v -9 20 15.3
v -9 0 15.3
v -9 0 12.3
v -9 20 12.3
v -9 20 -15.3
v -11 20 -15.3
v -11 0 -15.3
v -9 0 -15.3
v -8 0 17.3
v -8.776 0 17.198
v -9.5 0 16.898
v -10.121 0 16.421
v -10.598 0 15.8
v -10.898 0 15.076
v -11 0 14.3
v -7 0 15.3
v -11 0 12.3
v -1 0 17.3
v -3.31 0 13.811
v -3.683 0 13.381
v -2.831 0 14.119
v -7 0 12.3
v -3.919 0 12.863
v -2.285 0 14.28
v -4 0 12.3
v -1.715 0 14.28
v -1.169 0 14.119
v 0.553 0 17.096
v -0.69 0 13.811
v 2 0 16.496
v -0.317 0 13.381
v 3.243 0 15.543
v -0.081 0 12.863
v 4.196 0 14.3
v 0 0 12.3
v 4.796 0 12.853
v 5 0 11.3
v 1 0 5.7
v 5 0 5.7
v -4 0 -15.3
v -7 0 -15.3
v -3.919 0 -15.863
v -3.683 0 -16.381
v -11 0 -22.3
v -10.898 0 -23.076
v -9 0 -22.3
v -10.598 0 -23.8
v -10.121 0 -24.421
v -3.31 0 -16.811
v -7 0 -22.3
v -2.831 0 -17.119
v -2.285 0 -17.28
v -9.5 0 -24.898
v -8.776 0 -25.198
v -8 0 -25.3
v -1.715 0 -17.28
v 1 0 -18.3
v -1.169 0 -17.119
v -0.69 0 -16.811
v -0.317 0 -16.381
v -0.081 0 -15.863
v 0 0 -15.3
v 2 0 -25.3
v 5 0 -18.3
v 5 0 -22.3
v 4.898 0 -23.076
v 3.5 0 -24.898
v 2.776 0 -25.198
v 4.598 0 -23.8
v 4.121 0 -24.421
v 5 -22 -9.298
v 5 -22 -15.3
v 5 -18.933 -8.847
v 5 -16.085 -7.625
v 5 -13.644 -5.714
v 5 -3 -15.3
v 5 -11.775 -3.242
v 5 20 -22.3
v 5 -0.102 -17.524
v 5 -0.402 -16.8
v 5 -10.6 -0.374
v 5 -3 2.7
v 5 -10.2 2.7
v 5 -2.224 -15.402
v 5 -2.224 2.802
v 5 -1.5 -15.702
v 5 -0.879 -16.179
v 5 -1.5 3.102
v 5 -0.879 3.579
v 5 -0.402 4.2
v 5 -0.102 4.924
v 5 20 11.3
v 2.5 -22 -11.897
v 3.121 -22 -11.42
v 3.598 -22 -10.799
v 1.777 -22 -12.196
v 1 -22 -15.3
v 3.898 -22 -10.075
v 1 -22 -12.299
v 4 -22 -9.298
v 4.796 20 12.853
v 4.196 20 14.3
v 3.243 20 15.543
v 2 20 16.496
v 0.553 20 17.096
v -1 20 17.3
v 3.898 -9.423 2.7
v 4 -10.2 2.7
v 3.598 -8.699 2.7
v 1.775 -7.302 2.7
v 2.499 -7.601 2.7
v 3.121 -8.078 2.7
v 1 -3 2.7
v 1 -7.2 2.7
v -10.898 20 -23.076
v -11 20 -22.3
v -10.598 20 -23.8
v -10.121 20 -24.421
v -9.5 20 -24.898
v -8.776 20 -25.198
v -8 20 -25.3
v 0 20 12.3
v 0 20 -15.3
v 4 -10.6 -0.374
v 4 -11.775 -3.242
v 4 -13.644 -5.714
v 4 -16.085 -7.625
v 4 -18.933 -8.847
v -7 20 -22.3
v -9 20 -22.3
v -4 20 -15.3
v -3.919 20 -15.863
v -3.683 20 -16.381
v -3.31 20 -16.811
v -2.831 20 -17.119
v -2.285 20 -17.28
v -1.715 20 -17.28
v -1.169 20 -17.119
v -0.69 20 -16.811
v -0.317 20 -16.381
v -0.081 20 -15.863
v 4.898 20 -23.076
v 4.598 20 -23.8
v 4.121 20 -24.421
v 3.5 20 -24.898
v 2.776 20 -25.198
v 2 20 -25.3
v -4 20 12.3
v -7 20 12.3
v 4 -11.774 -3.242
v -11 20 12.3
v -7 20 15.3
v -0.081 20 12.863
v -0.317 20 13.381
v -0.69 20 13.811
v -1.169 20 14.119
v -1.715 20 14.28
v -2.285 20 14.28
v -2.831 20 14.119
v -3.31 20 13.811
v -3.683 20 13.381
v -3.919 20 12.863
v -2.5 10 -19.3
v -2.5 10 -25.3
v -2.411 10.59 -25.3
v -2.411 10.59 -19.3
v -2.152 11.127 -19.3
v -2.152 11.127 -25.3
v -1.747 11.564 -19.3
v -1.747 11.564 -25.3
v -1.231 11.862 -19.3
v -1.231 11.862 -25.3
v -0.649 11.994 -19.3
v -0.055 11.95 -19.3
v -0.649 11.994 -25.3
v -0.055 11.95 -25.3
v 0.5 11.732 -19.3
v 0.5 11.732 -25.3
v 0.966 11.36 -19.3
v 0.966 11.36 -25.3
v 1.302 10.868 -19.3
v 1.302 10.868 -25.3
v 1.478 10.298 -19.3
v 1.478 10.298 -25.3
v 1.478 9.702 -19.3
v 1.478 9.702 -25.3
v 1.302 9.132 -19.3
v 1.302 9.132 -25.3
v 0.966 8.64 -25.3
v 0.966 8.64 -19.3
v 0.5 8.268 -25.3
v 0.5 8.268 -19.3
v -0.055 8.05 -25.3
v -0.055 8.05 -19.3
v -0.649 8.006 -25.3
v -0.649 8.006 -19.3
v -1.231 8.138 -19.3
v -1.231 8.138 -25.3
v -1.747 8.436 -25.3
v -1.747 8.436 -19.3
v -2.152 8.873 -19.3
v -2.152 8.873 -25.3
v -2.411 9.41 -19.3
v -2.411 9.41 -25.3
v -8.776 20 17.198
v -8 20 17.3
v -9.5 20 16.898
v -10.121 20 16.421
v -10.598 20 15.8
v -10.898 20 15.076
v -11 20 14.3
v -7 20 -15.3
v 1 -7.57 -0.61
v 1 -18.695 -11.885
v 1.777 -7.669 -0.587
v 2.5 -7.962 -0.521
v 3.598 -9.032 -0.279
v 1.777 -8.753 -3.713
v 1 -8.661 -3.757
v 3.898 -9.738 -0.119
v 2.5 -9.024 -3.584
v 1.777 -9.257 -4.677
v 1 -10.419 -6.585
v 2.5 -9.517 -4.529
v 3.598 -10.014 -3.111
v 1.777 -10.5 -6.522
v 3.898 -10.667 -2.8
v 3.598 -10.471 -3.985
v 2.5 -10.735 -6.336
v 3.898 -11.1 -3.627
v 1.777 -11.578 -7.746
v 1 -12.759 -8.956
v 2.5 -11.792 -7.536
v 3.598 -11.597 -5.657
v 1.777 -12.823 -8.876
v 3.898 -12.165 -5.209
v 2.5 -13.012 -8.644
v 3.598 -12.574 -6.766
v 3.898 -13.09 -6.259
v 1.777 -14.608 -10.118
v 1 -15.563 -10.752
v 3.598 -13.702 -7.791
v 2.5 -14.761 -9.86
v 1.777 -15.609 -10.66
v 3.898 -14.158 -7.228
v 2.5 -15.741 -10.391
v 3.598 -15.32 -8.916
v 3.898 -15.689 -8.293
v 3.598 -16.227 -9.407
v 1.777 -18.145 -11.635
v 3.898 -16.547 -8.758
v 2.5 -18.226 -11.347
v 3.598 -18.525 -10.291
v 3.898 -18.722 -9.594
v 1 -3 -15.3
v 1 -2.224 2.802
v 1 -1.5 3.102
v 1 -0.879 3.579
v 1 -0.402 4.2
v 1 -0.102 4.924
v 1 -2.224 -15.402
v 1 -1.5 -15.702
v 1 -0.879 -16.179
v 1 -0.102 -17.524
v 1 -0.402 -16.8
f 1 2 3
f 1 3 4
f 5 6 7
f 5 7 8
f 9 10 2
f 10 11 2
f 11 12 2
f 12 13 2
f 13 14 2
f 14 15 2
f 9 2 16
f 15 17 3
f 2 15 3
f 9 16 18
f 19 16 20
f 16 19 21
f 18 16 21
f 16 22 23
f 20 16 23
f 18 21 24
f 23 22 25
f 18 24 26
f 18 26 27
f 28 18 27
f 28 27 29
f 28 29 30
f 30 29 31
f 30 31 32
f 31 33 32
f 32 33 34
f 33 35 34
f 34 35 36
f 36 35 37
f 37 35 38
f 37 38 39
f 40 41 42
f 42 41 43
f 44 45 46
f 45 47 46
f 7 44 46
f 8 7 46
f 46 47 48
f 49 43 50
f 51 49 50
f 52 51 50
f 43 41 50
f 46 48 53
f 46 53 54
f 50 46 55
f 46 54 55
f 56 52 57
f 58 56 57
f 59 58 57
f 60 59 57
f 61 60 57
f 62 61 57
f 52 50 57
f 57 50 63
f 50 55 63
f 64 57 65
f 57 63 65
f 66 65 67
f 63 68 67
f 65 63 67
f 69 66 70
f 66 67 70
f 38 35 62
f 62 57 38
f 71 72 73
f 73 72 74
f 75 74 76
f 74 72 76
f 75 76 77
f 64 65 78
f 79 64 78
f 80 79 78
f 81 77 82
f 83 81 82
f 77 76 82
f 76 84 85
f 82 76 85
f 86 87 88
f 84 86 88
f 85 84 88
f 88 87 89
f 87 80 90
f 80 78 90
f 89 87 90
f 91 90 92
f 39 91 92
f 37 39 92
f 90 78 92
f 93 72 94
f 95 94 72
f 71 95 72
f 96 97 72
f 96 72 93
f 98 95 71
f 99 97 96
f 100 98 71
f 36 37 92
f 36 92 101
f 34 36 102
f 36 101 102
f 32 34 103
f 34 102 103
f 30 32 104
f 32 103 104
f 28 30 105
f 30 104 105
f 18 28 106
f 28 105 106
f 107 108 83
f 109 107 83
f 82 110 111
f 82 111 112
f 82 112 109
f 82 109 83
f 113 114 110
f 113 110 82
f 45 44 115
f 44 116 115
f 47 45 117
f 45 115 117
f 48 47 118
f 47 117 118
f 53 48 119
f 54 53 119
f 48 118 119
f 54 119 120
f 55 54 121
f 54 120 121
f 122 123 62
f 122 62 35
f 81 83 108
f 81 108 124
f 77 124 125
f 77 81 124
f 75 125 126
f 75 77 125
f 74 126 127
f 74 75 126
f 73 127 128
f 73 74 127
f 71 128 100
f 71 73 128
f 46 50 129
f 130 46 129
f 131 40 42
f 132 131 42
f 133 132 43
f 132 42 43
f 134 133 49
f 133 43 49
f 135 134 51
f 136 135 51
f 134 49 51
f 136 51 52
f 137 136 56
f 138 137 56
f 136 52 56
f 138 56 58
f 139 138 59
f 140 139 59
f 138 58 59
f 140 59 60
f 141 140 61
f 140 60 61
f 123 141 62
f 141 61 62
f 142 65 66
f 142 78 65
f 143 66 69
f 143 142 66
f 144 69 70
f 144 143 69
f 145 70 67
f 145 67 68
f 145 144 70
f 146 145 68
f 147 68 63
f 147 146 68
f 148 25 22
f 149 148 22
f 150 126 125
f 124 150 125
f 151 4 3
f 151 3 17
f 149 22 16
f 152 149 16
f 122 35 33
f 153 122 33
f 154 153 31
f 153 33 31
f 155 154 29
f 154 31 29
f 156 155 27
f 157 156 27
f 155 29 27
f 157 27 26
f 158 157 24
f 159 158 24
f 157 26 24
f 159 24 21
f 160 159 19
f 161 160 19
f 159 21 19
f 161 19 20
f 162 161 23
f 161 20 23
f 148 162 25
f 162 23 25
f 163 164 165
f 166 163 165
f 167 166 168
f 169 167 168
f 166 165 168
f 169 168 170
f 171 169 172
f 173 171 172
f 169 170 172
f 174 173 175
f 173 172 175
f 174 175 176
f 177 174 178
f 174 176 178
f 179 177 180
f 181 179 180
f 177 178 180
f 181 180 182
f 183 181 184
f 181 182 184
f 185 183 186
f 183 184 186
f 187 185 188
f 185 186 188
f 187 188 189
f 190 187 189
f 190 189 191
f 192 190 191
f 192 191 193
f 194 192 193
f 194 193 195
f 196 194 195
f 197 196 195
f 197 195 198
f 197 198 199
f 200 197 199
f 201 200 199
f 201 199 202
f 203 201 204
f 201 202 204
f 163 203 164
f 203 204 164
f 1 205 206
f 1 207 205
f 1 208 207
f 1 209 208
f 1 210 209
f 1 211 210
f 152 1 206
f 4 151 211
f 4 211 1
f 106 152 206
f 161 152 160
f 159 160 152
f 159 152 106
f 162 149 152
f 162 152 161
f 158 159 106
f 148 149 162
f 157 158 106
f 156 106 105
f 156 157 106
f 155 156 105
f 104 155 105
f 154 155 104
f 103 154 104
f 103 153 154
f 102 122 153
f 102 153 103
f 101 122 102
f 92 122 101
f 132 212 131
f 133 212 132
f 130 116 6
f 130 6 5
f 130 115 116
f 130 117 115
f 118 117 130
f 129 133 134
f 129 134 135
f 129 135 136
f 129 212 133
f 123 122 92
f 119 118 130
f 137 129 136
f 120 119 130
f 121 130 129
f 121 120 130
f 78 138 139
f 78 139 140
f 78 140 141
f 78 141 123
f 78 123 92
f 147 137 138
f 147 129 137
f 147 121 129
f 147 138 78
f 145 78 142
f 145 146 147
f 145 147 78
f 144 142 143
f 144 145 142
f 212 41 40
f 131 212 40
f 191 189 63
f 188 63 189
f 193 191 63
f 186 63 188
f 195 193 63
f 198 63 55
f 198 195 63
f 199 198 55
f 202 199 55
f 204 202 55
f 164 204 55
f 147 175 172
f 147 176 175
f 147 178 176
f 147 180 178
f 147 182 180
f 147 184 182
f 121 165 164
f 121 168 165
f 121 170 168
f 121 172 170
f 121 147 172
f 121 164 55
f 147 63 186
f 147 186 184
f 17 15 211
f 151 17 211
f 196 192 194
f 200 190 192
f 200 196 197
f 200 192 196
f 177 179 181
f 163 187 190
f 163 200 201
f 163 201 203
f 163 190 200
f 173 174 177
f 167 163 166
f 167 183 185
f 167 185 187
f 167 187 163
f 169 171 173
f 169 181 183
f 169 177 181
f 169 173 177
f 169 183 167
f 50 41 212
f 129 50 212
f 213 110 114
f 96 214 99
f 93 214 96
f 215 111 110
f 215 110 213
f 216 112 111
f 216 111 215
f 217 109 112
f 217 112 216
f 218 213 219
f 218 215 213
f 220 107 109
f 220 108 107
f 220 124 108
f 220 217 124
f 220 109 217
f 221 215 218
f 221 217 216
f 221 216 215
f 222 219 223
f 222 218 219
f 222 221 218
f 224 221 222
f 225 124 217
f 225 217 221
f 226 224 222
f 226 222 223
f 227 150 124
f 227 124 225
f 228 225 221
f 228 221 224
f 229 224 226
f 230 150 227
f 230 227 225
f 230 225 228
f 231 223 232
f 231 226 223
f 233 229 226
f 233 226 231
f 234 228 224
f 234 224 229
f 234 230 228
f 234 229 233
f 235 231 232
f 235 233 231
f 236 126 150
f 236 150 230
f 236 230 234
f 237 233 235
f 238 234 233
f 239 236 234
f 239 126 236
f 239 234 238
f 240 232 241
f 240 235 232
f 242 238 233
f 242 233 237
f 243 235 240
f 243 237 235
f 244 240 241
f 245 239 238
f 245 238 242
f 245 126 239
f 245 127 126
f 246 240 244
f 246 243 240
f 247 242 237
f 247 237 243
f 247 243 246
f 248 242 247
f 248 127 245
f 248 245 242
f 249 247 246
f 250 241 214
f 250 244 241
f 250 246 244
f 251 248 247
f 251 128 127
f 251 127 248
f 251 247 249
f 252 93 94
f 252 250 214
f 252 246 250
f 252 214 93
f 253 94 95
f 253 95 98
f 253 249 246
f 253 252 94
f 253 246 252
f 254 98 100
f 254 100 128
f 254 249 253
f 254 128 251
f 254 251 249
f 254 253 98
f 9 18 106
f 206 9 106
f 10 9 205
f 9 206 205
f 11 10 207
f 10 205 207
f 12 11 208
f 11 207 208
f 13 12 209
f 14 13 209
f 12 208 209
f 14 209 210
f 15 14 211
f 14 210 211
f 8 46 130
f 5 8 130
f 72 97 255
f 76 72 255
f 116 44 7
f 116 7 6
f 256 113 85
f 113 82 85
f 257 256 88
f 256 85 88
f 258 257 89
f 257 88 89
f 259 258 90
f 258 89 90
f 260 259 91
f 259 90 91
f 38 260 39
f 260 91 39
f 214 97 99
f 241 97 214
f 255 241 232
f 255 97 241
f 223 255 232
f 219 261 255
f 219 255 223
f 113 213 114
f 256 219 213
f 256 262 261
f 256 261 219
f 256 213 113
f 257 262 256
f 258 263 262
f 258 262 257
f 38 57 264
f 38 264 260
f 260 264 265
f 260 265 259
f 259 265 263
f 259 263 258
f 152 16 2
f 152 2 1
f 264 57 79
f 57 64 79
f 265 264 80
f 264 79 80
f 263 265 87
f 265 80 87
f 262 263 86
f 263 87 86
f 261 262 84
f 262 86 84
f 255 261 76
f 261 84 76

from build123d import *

# Parameters (mm, degrees)
BOSS_EXTRUDE1_DEPTH     = 20
SKETCH3_W               = 12
SKETCH3_H               = 20
BOSS_EXTRUDE2_DEPTH     = 5
FILLET1_R               = 6
FILLET2_R               = 3
SKETCH4_R               = 2
CUT_EXTRUDE1_DEPTH      = 6
SKETCH5_W               = 2
SKETCH5_H               = 20
SKETCH5_W_2             = 3
BOSS_EXTRUDE3_DEPTH     = 4
SKETCH6_W               = 2
SKETCH6_H               = 20
BOSS_EXTRUDE4_DEPTH     = 3
SKETCH7_W               = 2
SKETCH7_H               = 20
BOSS_EXTRUDE5_DEPTH     = 7
FILLET3_R               = 3
SKETCH8_W               = 18
SKETCH8_H               = 22
BOSS_EXTRUDE6_DEPTH     = 5
CUT_EXTRUDE2_DEPTH      = 36.285832851
CUT_EXTRUDE2_DEPTH_BACK = 4
CUT_EXTRUDE3_DEPTH      = 36.285832851
CUT_EXTRUDE3_DEPTH_BACK = 36.285832851
FILLET4_R               = 3
SKETCH11_W              = 18
SKETCH11_H              = 22
CUT_EXTRUDE4_DEPTH      = 1
FILLET5_R               = 3


with BuildPart() as part:
    # Sketch1 → Boss-Extrude1 (new body)
    with BuildSketch(Plane(origin=(0, 0, 0), x_dir=(1, 0, 0), z_dir=(0, 1, 0))):
        with BuildLine():
            Line((0, 15.3), (0, -12.3))
            ThreePointArc((0, -12.3), (-2, -14.3), (-4, -12.3))
            Line((-4, -12.3), (-7, -12.3))
            Line((-7, -12.3), (-7, -17.3))
            Line((-7, -17.3), (5, -17.3))
            Line((5, -17.3), (5, 20.3))
            Line((5, 20.3), (-7, 20.3))
            Line((-7, 20.3), (-7, 15.3))
            Line((-7, 15.3), (-4, 15.3))
            ThreePointArc((-4, 15.3), (-2, 17.3), (0, 15.3))
        make_face()
    extrude(amount=BOSS_EXTRUDE1_DEPTH)

    # Sketch3 → Boss-Extrude2 (add)
    with BuildSketch(Plane(origin=(0, 0, -20.3), x_dir=(-1, 0, 0), z_dir=(0, 0, -1))):
        with Locations((1, 10)):
            Rectangle(SKETCH3_W, SKETCH3_H)
    extrude(amount=BOSS_EXTRUDE2_DEPTH)

    # Fillet1
    fillet1_edges = [part.edges().sort_by_distance(p)[0] for p in [
        (5, 10, 17.3),
    ]]
    fillet(fillet1_edges, radius=FILLET1_R)

    # Fillet2
    fillet2_edges = [part.edges().sort_by_distance(p)[0] for p in [
        (5, 10, -25.3),
    ]]
    fillet(fillet2_edges, radius=FILLET2_R)

    # Sketch4 → Cut-Extrude1 (cut)
    with BuildSketch(Plane(origin=(0, 0, -25.3), x_dir=(-1, 0, 0), z_dir=(0, 0, -1))):
        with Locations((0.5, 10)):
            Circle(SKETCH4_R)
    extrude(amount=-CUT_EXTRUDE1_DEPTH, mode=Mode.SUBTRACT)

    # Sketch5 → Boss-Extrude3 (add)
    with BuildSketch(Plane.ZY.offset(7)):
        with Locations((16.3, 10)):
            Rectangle(SKETCH5_W, SKETCH5_H)
        with Locations((-23.8, 10)):
            Rectangle(SKETCH5_W_2, SKETCH5_H)
    extrude(amount=BOSS_EXTRUDE3_DEPTH)

    # Sketch6 → Boss-Extrude4 (add)
    with BuildSketch(Plane(origin=(0, 0, 15.3), x_dir=(-1, 0, 0), z_dir=(0, 0, -1))):
        with Locations((10, 10)):
            Rectangle(SKETCH6_W, SKETCH6_H)
    extrude(amount=BOSS_EXTRUDE4_DEPTH)

    # Sketch7 → Boss-Extrude5 (add)
    with BuildSketch(Plane.XY.offset(-22.3)):
        with Locations((-10, 10)):
            Rectangle(SKETCH7_W, SKETCH7_H)
    extrude(amount=BOSS_EXTRUDE5_DEPTH)

    # Fillet3
    fillet3_edges = [part.edges().sort_by_distance(p)[0] for p in [
        (-11, 10, 17.3),
        (-11, 10, -25.3),
    ]]
    fillet(fillet3_edges, radius=FILLET3_R)

    # Sketch8 → Boss-Extrude6 (add)
    with BuildSketch(Plane.ZY):
        with Locations((-6.3, -11)):
            Rectangle(SKETCH8_W, SKETCH8_H)
    extrude(amount=-BOSS_EXTRUDE6_DEPTH)

    # Sketch9 → Cut-Extrude2 (cut, two sides: drawn at the far end of the back side and taken through both)
    with BuildSketch(Plane.ZY.offset(-CUT_EXTRUDE2_DEPTH_BACK)):
        with BuildLine():
            Line((2.7, -10.2), (2.7, -7.2))
            ThreePointArc((2.7, -7.2), (-7.835653753, -11.522921748), (-12.298666607, -22))
            Line((-12.298666607, -22), (-9.298333218, -22))
            ThreePointArc((-9.298333218, -22), (-5.714273587, -13.644300146), (2.7, -10.2))
        make_face()
    extrude(amount=CUT_EXTRUDE2_DEPTH + CUT_EXTRUDE2_DEPTH_BACK, mode=Mode.SUBTRACT)

    # Sketch9<3> → Cut-Extrude3 (cut, two sides: drawn at the far end of the back side and taken through both)
    with BuildSketch(Plane.ZY.offset(-CUT_EXTRUDE3_DEPTH_BACK)):
        with BuildLine():
            Line((2.7, -22), (2.7, -10.2))
            ThreePointArc((2.7, -10.2), (-5.714273587, -13.644300146), (-9.298333218, -22))
            Line((-9.298333218, -22), (2.7, -22))
        make_face()
    extrude(amount=CUT_EXTRUDE3_DEPTH + CUT_EXTRUDE3_DEPTH_BACK, mode=Mode.SUBTRACT)

    # Fillet4
    fillet4_edges = [part.edges().sort_by_distance(p)[0] for p in [
        (4, -11.522921748, -7.835653753),
    ]]
    fillet(fillet4_edges, radius=FILLET4_R - 0.0001)  # a hair under: the kernel refuses the full size

    # Sketch11 → Cut-Extrude4 (cut)
    with BuildSketch(Plane.ZY):
        with Locations((-6.3, -11)):
            Rectangle(SKETCH11_W, SKETCH11_H)
    extrude(amount=-CUT_EXTRUDE4_DEPTH, mode=Mode.SUBTRACT)

    # Fillet5
    fillet5_edges = [part.edges().sort_by_distance(p)[0] for p in [
        (3, 0, -15.3),
        (3, 0, 2.7),
    ]]
    fillet(fillet5_edges, radius=FILLET5_R)


solid = part.part
